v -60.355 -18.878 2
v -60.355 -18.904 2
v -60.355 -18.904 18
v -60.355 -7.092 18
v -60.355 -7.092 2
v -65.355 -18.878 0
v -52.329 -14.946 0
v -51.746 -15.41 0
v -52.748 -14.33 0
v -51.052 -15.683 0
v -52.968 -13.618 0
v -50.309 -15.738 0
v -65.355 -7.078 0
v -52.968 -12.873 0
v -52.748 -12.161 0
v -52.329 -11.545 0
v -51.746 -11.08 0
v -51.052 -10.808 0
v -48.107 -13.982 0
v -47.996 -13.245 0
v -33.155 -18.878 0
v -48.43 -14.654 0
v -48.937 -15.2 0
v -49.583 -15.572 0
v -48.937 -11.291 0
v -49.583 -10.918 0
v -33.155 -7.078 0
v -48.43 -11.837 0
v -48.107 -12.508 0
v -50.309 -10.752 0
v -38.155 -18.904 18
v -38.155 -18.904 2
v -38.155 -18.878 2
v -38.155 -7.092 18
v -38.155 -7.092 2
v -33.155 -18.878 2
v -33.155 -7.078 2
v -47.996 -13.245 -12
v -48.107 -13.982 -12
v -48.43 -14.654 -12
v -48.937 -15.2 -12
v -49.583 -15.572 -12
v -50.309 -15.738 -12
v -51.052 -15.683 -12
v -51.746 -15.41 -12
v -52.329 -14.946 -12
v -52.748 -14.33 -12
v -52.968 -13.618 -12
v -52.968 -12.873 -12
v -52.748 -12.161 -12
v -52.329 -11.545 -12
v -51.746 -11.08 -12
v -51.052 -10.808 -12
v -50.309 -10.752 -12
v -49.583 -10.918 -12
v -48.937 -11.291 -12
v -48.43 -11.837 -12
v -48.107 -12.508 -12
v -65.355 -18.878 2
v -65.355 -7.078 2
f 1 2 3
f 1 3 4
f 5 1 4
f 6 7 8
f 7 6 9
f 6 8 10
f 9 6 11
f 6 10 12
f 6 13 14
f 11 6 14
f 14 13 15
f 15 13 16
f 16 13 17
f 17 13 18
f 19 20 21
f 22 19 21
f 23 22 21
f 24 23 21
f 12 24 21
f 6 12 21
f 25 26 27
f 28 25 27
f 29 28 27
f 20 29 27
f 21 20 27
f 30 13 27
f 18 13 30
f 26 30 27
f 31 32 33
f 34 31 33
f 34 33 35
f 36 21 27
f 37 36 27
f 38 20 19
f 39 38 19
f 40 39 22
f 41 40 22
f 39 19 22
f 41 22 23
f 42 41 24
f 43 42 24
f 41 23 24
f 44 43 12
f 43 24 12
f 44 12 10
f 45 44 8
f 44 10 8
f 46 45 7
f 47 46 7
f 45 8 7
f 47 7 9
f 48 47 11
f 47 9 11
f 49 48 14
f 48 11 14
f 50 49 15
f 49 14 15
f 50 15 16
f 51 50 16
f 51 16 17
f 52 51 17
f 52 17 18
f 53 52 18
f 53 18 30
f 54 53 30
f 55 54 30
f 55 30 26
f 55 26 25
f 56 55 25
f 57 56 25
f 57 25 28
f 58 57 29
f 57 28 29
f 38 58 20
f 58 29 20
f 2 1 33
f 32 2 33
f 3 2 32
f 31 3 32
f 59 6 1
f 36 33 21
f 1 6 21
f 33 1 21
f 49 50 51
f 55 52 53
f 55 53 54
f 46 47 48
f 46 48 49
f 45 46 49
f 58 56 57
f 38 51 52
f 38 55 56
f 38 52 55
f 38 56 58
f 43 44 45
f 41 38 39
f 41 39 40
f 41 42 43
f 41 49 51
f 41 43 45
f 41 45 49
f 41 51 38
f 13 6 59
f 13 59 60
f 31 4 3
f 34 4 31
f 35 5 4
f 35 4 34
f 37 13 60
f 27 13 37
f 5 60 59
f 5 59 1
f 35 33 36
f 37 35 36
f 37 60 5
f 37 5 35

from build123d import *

# Parameters (mm, degrees)
ESBO_O1_W                = 32.2
ESBO_O1_H                = 11.8
RESSALTO_EXTRUS_O1_DEPTH = 2
ESBO_O2_W                = 22.2
ESBO_O2_H                = 11.812594062
RESSALTO_EXTRUS_O2_DEPTH = 16
ESBO_O3_R                = 2.5
RESSALTO_EXTRUS_O3_DEPTH = 12


with BuildPart() as part:
    # Esboço1 → Ressalto-extrusão1 (new body)
    with BuildSketch(Plane.XY):
        with Locations((-49.254652801, -12.977504244)):
            Rectangle(ESBO_O1_W, ESBO_O1_H)
    extrude(amount=RESSALTO_EXTRUS_O1_DEPTH)

    # Esboço2 → Ressalto-extrusão2 (add)
    with BuildSketch(Plane.XY.offset(2)):
        with Locations((-49.254652801, -12.997877007)):
            Rectangle(ESBO_O2_W, ESBO_O2_H)
    extrude(amount=RESSALTO_EXTRUS_O2_DEPTH)

    # Esboço3 → Ressalto-extrusão3 (add)
    with BuildSketch(Plane(origin=(0, 0, 0), x_dir=(-1, 0, 0), z_dir=(0, 0, -1))):
        with Locations(Location((50.495961023, -13.245250528, 0), (0, 0, 180))):
            Circle(ESBO_O3_R)
    extrude(amount=RESSALTO_EXTRUS_O3_DEPTH)


solid = part.part
